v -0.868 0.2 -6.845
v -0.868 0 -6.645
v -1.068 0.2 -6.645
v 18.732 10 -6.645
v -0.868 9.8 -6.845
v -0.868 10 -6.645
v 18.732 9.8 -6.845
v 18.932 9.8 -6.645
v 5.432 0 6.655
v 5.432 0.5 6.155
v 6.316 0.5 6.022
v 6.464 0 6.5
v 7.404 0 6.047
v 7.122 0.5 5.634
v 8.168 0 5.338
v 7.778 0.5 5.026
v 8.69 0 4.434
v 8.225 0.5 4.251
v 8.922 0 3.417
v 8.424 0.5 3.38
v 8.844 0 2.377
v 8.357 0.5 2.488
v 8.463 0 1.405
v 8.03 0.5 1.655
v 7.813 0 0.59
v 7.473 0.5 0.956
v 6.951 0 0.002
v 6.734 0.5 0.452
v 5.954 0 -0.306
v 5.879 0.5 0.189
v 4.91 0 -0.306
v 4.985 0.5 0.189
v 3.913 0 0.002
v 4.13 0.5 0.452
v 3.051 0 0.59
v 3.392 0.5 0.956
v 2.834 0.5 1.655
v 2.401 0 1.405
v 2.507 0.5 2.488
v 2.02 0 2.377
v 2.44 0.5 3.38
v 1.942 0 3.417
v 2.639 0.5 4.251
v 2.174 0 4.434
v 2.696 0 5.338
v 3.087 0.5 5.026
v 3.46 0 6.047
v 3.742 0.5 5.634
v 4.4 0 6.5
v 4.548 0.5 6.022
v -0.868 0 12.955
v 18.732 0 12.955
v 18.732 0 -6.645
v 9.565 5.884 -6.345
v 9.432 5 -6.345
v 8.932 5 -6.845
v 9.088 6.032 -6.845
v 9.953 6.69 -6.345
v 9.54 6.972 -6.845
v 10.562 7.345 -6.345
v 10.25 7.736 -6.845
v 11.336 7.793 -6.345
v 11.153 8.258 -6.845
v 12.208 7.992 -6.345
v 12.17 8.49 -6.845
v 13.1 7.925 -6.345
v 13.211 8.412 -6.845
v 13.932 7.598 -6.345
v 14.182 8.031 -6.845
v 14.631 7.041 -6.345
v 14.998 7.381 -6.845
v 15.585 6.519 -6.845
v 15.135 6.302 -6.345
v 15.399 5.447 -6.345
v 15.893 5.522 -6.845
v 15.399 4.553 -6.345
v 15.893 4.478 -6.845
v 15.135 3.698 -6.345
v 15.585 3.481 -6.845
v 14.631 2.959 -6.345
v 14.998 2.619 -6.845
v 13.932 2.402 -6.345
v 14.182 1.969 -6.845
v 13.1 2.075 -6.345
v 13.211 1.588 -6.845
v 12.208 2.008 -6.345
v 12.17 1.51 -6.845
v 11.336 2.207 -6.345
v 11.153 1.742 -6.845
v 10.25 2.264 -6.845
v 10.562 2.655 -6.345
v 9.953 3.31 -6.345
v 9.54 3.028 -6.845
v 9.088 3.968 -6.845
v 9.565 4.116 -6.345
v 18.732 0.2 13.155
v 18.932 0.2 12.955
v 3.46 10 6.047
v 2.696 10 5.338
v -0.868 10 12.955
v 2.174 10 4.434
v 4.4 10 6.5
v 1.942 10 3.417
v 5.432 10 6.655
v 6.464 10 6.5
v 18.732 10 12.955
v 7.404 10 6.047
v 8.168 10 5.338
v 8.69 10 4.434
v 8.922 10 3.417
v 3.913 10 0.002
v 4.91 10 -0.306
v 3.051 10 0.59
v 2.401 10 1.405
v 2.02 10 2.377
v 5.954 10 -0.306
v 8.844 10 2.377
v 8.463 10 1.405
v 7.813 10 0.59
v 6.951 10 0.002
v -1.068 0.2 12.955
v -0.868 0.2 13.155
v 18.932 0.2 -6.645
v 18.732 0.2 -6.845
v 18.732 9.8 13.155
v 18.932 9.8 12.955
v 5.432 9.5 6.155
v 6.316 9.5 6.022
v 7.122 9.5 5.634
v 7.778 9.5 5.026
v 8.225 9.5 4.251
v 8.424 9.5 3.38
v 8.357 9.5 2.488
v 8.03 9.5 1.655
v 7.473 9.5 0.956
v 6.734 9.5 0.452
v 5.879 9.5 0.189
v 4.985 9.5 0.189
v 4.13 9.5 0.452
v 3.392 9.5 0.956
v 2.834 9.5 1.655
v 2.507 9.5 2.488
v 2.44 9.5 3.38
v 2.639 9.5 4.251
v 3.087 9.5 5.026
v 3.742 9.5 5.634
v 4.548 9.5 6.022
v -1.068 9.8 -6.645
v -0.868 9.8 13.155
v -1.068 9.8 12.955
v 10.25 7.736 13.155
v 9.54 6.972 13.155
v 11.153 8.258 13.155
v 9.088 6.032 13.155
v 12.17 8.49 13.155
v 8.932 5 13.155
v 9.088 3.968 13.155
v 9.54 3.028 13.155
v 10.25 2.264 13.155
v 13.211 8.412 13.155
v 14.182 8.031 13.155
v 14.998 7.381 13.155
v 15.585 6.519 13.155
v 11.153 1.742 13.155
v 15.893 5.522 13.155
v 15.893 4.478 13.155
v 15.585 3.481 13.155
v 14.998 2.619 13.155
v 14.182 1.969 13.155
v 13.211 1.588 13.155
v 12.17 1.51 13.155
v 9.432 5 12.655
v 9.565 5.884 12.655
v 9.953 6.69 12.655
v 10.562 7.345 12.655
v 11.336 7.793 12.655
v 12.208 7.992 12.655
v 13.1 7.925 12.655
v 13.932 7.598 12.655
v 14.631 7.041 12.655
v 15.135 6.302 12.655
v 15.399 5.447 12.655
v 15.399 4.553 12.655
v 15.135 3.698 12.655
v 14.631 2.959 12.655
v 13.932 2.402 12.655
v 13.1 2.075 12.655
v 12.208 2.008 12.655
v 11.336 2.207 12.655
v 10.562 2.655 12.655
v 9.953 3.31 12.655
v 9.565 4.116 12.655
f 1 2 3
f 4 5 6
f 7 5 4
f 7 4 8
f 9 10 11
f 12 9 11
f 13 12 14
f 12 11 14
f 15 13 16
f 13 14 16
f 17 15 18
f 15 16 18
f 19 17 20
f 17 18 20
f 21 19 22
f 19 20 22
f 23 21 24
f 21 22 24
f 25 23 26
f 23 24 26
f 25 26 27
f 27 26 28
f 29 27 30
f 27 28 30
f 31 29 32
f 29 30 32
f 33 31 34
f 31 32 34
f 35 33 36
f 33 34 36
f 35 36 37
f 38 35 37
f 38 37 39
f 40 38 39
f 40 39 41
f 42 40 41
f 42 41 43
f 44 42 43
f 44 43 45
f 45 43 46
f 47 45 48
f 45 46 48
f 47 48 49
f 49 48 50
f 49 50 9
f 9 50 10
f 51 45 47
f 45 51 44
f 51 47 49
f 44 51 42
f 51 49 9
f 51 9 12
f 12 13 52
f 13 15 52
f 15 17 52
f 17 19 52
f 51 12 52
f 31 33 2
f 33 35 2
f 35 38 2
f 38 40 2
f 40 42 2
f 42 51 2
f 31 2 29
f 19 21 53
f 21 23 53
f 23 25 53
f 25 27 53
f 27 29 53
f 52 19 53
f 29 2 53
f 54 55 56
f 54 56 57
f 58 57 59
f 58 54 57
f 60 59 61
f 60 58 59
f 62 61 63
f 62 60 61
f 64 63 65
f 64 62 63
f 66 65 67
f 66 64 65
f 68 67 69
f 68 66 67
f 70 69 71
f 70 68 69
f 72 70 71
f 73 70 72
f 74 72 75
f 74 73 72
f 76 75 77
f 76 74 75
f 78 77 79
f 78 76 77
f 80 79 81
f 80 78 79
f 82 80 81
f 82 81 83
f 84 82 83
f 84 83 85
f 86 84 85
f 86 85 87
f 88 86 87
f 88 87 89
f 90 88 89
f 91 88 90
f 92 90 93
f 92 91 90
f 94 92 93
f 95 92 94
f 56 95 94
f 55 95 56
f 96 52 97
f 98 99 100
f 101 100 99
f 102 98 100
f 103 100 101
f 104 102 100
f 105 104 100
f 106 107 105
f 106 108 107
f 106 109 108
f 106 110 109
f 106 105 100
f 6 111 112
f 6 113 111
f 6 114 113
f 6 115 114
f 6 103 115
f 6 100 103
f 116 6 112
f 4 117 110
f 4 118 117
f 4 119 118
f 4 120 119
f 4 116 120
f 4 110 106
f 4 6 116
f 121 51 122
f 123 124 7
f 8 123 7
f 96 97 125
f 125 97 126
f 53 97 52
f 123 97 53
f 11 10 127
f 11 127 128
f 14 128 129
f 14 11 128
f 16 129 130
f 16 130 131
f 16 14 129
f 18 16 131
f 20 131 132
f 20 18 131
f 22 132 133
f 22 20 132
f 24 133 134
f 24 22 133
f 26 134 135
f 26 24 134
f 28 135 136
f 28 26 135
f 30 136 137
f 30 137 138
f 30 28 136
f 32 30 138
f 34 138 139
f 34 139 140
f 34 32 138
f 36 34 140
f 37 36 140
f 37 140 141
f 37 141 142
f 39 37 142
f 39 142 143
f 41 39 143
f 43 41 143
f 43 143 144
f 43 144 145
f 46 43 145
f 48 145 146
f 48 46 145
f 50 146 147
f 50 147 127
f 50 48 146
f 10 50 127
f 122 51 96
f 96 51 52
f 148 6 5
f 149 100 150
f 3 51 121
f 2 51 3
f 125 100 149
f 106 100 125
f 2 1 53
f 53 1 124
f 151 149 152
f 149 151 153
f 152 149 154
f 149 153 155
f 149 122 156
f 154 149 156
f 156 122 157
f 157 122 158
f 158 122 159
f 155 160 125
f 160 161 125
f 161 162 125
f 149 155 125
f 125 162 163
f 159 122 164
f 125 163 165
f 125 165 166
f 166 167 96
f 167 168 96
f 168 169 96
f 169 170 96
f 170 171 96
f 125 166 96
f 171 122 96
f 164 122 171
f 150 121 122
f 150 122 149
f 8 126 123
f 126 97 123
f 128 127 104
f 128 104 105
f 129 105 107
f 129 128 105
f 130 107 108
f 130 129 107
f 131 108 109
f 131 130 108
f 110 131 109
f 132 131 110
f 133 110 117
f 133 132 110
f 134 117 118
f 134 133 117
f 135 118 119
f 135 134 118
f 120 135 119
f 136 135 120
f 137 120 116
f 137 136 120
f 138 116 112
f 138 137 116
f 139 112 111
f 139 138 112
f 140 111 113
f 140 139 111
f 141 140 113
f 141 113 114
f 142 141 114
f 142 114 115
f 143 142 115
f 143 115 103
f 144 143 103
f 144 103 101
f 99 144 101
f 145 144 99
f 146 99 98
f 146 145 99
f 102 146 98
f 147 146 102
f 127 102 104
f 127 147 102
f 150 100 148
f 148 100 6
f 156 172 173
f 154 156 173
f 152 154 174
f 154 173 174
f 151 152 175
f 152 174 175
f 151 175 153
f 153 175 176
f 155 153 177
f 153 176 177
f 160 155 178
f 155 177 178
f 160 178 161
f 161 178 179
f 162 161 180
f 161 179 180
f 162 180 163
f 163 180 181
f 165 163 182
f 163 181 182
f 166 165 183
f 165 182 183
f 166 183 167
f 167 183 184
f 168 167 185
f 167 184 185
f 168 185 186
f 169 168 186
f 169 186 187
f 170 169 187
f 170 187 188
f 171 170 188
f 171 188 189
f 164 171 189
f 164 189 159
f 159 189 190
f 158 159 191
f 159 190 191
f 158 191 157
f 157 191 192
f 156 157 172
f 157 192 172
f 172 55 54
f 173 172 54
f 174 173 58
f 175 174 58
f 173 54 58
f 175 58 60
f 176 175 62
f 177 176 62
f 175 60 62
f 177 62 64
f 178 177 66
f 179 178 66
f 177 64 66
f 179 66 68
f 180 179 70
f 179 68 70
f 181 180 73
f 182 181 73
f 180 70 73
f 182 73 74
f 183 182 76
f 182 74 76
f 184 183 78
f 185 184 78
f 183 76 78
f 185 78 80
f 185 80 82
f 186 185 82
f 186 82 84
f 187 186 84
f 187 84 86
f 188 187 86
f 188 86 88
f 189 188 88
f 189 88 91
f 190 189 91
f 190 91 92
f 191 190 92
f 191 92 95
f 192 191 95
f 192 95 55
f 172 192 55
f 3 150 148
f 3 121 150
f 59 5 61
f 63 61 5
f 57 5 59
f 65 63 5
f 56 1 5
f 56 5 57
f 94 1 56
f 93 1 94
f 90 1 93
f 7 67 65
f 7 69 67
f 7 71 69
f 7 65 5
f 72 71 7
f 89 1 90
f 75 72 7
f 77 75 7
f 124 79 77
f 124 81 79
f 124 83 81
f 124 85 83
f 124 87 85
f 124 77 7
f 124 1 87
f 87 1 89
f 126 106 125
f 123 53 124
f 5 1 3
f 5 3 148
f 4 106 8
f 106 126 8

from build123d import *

# Parameters (mm, degrees)
SKETCH_1_W          = 20
SKETCH_1_H          = 20
SKETCH_1_R          = 3
EXTRUDE_1_DEPTH     = 10
SKETCH_2_R          = 3
CUT_EXTRUDE_1_DEPTH = 30.298841179
CHAMFER_3_SIZE      = 0.5
CHAMFER_4_SIZE      = 0.2


with BuildPart() as part:
    # 草图1 → 凸台-拉伸1 (new body)
    with BuildSketch(Plane(origin=(0, 0, 0), x_dir=(1, 0, 0), z_dir=(0, 1, 0))):
        with Locations((8.932038835, -3.155339806)):
            Rectangle(SKETCH_1_W, SKETCH_1_H)
        with Locations(Location((5.432038835, -3.155339806, 0), (0, 0, 270))):
            Circle(SKETCH_1_R, mode=Mode.SUBTRACT)
    extrude(amount=EXTRUDE_1_DEPTH)

    # 草图2 → 切除-拉伸1 (cut, through all)
    with BuildSketch(Plane(origin=(0, 0, -6.844660194), x_dir=(-1, 0, 0), z_dir=(0, 0, -1))):
        with Locations((-12.432038835, 5)):
            Circle(SKETCH_2_R)
    extrude(amount=-CUT_EXTRUDE_1_DEPTH, mode=Mode.SUBTRACT)

    # 倒角3
    chamfer_3_edges = [part.edges().sort_by_distance(p)[0] for p in [
        (5.432038835, 0, 0.155339806),
        (5.432038835, 10, 0.155339806),
        (15.432038835, 5, 13.155339806),
        (15.432038835, 5, -6.844660194),
    ]]
    chamfer(chamfer_3_edges, length=CHAMFER_3_SIZE)

    # 倒角4
    chamfer_4_edges = [part.edges().sort_by_distance(p)[0] for p in [
        (18.932038835, 10, 3.155339806),
        (8.932038835, 10, -6.844660194),
        (-1.067961165, 10, 3.155339806),
        (8.932038835, 0, -6.844660194),
        (18.932038835, 0, 3.155339806),
        (8.932038835, 0, 13.155339806),
        (-1.067961165, 0, 3.155339806),
        (8.932038835, 10, 13.155339806),
        (-1.067961165, 5, -6.844660194),
        (18.932038835, 5, -6.844660194),
        (18.932038835, 5, 13.155339806),
        (-1.067961165, 5, 13.155339806),
    ]]
    chamfer(chamfer_4_edges, length=CHAMFER_4_SIZE)


solid = part.part
